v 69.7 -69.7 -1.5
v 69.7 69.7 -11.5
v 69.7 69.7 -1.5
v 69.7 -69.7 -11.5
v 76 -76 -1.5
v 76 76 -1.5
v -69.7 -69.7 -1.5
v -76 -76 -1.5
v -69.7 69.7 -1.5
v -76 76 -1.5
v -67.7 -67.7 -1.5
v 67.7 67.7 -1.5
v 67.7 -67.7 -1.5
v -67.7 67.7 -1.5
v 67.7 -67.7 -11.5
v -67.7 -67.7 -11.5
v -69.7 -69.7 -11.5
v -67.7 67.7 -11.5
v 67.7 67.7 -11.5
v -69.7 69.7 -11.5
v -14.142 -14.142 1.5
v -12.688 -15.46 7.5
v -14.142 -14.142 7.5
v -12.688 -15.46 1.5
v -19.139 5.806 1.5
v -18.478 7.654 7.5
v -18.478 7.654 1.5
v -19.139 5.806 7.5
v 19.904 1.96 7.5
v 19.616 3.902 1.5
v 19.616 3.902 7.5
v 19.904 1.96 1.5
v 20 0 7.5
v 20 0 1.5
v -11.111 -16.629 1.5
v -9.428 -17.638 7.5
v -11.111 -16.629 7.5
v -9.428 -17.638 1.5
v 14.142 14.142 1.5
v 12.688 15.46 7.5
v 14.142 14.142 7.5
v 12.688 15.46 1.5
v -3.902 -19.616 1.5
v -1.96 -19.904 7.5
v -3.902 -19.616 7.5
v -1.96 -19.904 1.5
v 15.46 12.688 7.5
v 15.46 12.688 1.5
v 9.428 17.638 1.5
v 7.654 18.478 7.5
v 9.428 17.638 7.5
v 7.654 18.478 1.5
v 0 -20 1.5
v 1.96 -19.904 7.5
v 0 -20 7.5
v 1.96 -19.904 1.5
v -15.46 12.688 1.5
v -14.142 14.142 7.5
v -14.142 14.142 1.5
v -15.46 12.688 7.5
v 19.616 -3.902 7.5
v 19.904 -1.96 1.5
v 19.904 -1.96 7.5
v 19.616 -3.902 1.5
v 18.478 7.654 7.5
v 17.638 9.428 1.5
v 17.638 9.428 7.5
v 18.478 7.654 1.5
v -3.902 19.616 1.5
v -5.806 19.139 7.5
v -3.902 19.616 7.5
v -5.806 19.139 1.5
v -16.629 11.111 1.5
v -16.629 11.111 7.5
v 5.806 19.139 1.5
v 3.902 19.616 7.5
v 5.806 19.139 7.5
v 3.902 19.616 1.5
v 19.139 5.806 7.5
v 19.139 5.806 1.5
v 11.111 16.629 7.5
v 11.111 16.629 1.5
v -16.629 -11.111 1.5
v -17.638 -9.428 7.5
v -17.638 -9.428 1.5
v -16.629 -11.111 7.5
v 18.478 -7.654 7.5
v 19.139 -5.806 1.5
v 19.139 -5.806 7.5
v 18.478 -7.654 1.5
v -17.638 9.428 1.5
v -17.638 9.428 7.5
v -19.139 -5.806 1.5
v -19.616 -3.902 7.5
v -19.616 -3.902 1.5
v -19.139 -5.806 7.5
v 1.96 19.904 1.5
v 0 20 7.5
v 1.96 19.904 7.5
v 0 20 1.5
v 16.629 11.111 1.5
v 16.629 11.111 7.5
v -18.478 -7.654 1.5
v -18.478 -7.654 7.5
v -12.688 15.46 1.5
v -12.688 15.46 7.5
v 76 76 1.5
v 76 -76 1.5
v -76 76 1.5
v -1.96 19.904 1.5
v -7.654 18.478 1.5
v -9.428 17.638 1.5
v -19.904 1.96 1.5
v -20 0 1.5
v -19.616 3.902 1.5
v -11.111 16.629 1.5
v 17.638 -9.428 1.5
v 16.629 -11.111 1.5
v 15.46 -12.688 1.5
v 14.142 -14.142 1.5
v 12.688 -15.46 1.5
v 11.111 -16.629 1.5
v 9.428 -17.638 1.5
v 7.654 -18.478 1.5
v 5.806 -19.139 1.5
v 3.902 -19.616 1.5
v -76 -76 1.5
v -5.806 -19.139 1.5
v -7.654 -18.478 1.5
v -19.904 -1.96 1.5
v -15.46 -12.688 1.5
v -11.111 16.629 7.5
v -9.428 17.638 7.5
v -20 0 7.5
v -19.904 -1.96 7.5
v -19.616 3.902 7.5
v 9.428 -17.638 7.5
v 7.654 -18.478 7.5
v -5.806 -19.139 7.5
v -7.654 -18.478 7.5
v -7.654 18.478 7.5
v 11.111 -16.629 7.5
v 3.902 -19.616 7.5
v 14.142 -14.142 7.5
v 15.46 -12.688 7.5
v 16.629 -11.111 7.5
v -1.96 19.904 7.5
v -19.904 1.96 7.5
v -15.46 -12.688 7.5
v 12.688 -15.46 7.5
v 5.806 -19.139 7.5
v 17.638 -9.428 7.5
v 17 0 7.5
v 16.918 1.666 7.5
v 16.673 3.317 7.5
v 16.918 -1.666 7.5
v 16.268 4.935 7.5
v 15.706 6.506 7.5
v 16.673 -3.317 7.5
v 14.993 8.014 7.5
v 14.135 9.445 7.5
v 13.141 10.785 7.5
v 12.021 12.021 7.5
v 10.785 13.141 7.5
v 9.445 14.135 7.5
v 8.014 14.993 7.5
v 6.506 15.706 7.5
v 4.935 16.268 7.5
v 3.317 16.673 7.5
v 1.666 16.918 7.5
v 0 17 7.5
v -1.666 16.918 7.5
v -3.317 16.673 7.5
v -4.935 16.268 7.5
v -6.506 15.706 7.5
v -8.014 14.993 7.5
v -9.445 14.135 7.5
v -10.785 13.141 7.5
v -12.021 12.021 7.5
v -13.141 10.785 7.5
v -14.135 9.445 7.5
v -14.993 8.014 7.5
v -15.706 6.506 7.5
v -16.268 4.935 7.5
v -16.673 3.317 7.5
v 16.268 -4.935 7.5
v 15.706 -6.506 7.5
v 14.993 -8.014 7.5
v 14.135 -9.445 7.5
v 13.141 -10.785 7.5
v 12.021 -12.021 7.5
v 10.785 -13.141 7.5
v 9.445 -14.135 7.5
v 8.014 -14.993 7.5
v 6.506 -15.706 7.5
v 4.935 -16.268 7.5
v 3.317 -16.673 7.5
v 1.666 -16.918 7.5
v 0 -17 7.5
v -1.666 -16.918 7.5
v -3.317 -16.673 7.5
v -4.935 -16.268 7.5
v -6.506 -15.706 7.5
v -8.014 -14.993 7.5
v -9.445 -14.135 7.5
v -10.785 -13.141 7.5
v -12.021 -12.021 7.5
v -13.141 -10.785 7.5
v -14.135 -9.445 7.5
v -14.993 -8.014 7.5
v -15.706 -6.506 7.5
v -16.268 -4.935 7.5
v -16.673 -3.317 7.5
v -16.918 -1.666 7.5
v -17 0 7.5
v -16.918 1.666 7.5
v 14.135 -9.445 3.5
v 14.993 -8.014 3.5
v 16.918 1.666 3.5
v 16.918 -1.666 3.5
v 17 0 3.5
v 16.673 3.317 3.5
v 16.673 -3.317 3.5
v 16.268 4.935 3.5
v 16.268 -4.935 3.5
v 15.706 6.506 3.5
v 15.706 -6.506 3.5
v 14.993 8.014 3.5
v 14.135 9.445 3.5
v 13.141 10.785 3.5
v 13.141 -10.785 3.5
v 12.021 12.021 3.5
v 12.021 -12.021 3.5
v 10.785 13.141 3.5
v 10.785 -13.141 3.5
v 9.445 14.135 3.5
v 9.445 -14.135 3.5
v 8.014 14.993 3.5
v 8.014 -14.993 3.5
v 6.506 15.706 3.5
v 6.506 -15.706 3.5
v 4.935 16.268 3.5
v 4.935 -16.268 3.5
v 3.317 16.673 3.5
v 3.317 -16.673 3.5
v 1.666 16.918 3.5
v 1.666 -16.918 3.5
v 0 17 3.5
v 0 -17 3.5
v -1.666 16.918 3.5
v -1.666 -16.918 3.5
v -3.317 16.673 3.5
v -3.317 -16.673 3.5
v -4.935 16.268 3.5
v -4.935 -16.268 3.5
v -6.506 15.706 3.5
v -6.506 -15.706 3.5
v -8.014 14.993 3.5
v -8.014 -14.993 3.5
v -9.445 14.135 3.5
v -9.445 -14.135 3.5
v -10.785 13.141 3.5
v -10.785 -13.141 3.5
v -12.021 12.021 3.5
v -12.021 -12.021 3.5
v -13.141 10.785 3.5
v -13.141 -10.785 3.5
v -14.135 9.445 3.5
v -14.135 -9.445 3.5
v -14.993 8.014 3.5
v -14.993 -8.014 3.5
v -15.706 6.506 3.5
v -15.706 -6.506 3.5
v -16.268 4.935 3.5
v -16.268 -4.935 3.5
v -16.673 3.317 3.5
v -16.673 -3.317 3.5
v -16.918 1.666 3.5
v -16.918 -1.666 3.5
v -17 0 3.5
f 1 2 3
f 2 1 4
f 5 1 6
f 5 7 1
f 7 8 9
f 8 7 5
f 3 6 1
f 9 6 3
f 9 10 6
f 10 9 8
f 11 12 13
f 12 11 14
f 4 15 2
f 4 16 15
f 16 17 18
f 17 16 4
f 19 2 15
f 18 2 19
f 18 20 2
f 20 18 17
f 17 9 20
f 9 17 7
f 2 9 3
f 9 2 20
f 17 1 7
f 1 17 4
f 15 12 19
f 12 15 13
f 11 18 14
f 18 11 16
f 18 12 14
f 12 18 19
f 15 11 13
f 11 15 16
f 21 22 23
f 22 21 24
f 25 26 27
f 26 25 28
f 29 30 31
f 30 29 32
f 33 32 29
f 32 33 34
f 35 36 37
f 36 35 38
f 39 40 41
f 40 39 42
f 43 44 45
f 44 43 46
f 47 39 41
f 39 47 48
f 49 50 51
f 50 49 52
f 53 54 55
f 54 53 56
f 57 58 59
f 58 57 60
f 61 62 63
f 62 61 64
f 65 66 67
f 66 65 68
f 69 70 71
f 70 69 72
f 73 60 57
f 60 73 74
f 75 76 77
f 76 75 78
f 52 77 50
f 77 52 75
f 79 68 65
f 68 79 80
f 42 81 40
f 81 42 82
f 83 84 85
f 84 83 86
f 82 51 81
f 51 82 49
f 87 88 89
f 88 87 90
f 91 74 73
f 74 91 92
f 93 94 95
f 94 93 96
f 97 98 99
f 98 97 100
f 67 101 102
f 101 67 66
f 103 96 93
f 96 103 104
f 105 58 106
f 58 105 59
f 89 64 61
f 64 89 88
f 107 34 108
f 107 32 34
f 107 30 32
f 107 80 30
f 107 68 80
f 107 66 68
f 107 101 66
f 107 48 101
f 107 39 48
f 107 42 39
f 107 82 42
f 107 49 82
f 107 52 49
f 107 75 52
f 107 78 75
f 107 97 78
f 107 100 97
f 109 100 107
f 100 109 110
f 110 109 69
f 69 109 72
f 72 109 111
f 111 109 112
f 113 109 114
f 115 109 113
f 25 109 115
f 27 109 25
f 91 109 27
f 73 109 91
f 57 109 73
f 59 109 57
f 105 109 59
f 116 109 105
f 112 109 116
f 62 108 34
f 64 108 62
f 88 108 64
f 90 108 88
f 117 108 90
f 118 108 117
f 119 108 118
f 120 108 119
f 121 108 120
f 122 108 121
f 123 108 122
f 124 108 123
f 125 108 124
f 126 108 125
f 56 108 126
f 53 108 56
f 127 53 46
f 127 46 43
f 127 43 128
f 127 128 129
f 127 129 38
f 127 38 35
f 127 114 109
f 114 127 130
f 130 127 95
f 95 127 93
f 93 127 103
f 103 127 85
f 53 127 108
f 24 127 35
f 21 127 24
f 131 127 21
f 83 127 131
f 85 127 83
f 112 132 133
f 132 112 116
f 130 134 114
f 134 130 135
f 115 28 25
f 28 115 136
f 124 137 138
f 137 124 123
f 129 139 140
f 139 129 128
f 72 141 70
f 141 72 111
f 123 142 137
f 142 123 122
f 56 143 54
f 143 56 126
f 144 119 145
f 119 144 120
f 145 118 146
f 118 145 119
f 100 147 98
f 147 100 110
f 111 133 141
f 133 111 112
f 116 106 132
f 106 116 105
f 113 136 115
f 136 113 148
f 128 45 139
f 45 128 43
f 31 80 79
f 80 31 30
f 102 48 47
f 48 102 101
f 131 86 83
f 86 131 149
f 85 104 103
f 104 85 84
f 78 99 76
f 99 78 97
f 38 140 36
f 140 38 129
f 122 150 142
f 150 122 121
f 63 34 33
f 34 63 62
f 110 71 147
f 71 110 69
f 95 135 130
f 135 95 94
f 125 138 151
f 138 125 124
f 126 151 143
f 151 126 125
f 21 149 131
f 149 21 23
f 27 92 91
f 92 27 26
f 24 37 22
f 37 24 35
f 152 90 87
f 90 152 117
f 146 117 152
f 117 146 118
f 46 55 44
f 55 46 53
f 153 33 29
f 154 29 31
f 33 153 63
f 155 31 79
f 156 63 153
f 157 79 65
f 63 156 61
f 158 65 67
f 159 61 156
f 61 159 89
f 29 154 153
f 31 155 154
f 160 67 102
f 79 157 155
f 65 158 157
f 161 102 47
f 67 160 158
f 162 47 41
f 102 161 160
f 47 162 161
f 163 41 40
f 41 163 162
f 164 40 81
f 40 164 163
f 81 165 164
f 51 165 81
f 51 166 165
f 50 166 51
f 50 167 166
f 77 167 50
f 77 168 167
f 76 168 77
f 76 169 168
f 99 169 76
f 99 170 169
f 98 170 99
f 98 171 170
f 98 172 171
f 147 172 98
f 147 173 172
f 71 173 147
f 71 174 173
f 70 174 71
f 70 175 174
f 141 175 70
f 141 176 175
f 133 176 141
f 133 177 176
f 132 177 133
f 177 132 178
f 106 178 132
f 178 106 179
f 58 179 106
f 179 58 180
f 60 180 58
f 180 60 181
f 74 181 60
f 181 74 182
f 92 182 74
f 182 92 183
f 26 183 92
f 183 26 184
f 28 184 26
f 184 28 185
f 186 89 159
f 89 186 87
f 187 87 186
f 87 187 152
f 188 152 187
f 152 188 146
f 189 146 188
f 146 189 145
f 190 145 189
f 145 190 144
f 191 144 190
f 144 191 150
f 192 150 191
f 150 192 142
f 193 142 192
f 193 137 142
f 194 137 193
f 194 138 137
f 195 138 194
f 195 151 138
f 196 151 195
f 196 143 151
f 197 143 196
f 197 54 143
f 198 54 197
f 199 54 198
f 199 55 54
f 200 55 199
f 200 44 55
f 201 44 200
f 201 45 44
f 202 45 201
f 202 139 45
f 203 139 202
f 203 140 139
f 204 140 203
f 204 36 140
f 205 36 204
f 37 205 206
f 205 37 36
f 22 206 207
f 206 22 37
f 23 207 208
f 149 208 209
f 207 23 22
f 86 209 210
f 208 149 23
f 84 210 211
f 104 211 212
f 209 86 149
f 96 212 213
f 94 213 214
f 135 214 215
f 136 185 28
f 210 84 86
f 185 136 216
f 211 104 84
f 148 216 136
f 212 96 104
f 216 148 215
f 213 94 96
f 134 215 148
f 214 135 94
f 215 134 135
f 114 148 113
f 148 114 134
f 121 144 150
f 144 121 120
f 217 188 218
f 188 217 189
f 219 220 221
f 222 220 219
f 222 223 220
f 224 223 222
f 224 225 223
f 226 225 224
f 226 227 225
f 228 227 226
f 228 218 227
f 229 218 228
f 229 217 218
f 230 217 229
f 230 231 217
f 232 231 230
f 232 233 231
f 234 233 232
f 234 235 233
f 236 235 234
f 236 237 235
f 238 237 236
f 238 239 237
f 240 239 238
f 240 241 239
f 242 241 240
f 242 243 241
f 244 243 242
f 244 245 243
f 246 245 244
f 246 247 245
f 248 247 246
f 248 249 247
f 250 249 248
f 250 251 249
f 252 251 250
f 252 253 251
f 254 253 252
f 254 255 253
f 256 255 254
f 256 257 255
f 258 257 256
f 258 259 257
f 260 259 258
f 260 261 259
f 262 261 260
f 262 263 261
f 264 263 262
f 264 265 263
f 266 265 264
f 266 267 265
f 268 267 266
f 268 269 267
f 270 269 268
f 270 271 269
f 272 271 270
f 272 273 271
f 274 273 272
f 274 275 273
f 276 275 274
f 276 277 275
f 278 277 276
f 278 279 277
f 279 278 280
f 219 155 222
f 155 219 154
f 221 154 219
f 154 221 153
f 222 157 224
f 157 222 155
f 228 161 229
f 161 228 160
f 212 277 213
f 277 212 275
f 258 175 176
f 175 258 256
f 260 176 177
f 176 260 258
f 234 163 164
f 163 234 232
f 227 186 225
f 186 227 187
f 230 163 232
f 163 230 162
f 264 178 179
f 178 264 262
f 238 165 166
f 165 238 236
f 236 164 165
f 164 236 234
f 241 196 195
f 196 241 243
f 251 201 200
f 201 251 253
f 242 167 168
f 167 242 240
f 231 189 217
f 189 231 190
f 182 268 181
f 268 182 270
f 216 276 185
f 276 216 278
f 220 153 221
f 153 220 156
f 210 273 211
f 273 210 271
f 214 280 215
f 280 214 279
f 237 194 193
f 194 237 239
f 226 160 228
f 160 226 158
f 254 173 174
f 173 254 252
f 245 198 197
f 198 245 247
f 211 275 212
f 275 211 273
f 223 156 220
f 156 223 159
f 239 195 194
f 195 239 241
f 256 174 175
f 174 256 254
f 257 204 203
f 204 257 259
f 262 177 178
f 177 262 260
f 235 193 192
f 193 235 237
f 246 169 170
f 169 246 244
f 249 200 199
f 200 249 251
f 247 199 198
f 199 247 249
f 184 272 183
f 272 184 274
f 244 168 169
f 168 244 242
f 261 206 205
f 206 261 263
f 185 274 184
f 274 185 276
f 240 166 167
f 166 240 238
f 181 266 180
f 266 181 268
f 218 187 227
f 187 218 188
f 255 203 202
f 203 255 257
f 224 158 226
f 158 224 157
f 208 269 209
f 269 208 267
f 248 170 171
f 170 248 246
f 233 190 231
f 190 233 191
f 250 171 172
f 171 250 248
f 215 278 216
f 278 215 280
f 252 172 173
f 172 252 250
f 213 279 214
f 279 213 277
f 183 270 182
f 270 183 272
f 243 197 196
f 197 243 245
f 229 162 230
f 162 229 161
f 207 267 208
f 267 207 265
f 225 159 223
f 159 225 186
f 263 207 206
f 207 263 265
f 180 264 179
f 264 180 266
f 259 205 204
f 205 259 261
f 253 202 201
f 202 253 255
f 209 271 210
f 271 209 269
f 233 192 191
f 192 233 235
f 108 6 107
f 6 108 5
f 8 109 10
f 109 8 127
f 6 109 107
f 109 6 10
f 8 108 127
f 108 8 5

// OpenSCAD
// file: common.scad
// common.scad — every dimension in the feeder lives here.
// Change a value, re-run ../check.sh, and every part regrows together.

/* ---------- Printer envelope ---------- */
bed_x = 220;
bed_y = 220;
bed_z = 250;

/* ---------- Material and process ---------- */
wall      = 2.0;    // nominal wall thickness (5 perimeters at 0.4 nozzle)
fit_slide = 0.30;   // clearance for parts that must move against each other
fit_press = 0.15;   // clearance for parts pressed together
$fn       = 96;

/* ---------- Fasteners ---------- */
m3_free = 3.4;      // M3 clearance hole
m3_tap  = 2.8;      // M3 self-tapping into plastic
m4_free = 4.5;

/* ---------- Load cells (VERIFY against the cells you actually buy) ----------
   Figures below are for the common YZC-133 straight bar. Bolt spacing varies
   between suppliers; measure yours before printing the base or the platform. */
cell_l            = 80;
cell_w            = 12.7;
cell_h            = 12.7;
cell_bolt_spacing = 15;   // centre-to-centre, at each end
cell_gap          = 3;    // spacer thickness — the beam MUST be free to flex

/* ---------- Food model ---------- */
kibble_density = 0.40;   // g/cm^3, dry kibble bulk density

/* ---------- Hopper ---------- */
hopper_volume_l = 2.0;
hopper_mouth    = 140;   // inner, square, at the top
hopper_throat   = 55;    // inner, square, at the bottom

// Square frustum volume: V = h/3 * (A1 + A2 + sqrt(A1*A2))
// For squares sqrt(A1*A2) collapses to mouth*throat, so height is exact:
hopper_h = 3 * hopper_volume_l * 1000000 /
           (hopper_mouth*hopper_mouth + hopper_throat*hopper_throat +
            hopper_mouth*hopper_throat);

hopper_run        = (hopper_mouth - hopper_throat) / 2;
hopper_wall_angle = atan(hopper_h / hopper_run);   // from horizontal
hopper_taper_rate = (hopper_mouth - hopper_throat) / hopper_h;
hopper_capacity_g = hopper_volume_l * 1000 * kibble_density;

/* ---------- Drum valve ---------- */
drum_dia       = 50;
drum_len       = 60;
drum_clearance = 0.4;                      // radial
drum_bore      = drum_dia + 2*drum_clearance;
pocket_depth   = 11.3;                     // segment depth of the scoop
shaft_dia      = 6;
shaft_len      = 8;

// Circular-segment maths. OpenSCAD trig is in DEGREES; the segment area
// formula needs the angle in RADIANS, hence the two forms below.
drum_r          = drum_dia / 2;
pocket_theta    = 2 * acos(1 - pocket_depth/drum_r);        // degrees
pocket_theta_r  = pocket_theta * PI / 180;                  // radians
pocket_area     = drum_r*drum_r/2 * (pocket_theta_r - sin(pocket_theta));
pocket_volume   = pocket_area * drum_len;                   // mm^3
sweep_grams     = pocket_volume / 1000 * kibble_density;    // DERIVED, not assumed

/* ---------- Valve housing ---------- */
housing_x = drum_len + 4*wall;      // along the drum axis
housing_y = drum_bore + 4*wall;
housing_z = drum_bore + 4*wall;
outlet_x  = 45;
outlet_y  = 45;

/* ---------- Chute ---------- */
chute_forward = 70;    // how far forward of the tower the food lands
chute_drop    = 90;    // vertical fall from valve outlet to chute exit
chute_exit    = 40;
chute_clear   = 40;    // exit height above the bowl rim — impulse, not load

/* ---------- Bowl and platform ---------- */
bowl_dia     = 140;    // the BOUGHT stainless/ceramic bowl
platform_dia = 150;
platform_t   = 5;
ring_w       = 3;
ring_h       = 8;
bowl_gap     = 6;      // air on every side — the isolation gap

/* ---------- Base and tower ---------- */
base_size = 190;
base_t    = 6;
bay_h     = 28;        // electronics bay height
tower_w   = 90;
tower_d   = 70;
tower_h   = 150;

/* ---------- Head ---------- */
head_tilt   = 30;      // camera, degrees down from horizontal
cam_pcb     = [40, 40, 1.6];
sr04_dia    = 16;
sr04_pitch  = 26;      // centre-to-centre of the two transducers

/* ---------- Derived overall ---------- */
total_h = base_t + bay_h + tower_h + housing_z + hopper_h;

/* ---------- Assertions: the things that silently ruin a print ---------- */
assert(hopper_wall_angle >= 60,
       str("Hopper wall ", hopper_wall_angle, " deg is below 60 - kibble will bridge"));
assert(hopper_h + 2*wall <= bed_z,
       str("Hopper ", hopper_h, " mm exceeds bed Z ", bed_z));
assert(hopper_mouth + 2*wall <= bed_x,
       "Hopper mouth exceeds bed X");
assert(base_size <= bed_x && base_size <= bed_y,
       "Base exceeds bed footprint");
assert(platform_dia <= bed_x, "Bowl platform exceeds bed X");
assert(drum_clearance > 0, "Drum clearance must be positive or the drum seizes");
assert(drum_bore > drum_dia, "Drum bore must exceed drum diameter");
assert(pocket_depth < drum_r,
       "Pocket deeper than the drum radius - the scoop would cut through the axis");
assert(sweep_grams > 6 && sweep_grams < 10,
       str("Sweep delivers ", sweep_grams, " g - outside the 6-10 g design window"));
assert(bowl_gap > 0, "Bowl isolation gap must be positive");
assert(cell_gap > 0, "Load cell needs a flex gap or it reads nothing");
assert(chute_forward + 40 <= bed_y,
       "Bowl arm exceeds bed Y - split it or shorten chute_forward");

/* ---------- Shared geometry ---------- */
// A square frustum, bottom face on the XY plane, centred on Z.
module frustum(bottom, top, h) {
  linear_extrude(height = h, scale = top/bottom)
    square([bottom, bottom], center = true);
}

// A rectangular tube used for the labyrinth lip on the lid and hopper mouth.
module lip(inner, thickness, h) {
  difference() {
    cube([inner + 2*thickness, inner + 2*thickness, h], center = true);
    cube([inner, inner, h + 1], center = true);
  }
}

// Four bolt holes on a square pattern.
module bolt_square(spacing, dia, h) {
  for (i = [0:3])
    rotate([0, 0, 90*i])
      translate([spacing/2, spacing/2, 0])
        cylinder(d = dia, h = h, center = true, $fn = 24);
}

// The cantilever footprint a load cell bolts into: two holes plus a relief slot.
module cell_mount(dia = m3_tap, h = 10) {
  for (y = [-cell_bolt_spacing/2, cell_bolt_spacing/2])
    translate([0, y, 0]) cylinder(d = dia, h = h, center = true, $fn = 24);
}

echo(str("hopper_h = ", hopper_h, " mm"));
echo(str("hopper wall angle = ", hopper_wall_angle, " deg"));
echo(str("hopper capacity = ", hopper_capacity_g, " g"));
echo(str("sweep = ", sweep_grams, " g"));
echo(str("total height = ", total_h, " mm"));
// main file
include <common.scad>

lid_t     = 3;
lid_over  = 4;                 // overhang past the hopper rim
lid_inner = hopper_mouth - fit_slide * 2;

module lid() {
  union() {
    // Top plate.
    cube([hopper_mouth + 2*wall + 2*lid_over,
          hopper_mouth + 2*wall + 2*lid_over, lid_t], center = true);
    // Labyrinth lip that drops into the mouth — keeps humidity and paws out.
    translate([0, 0, -lid_t/2 - 5])
      lip(lid_inner - 2*wall, wall, 10);
    // Finger recess boss.
    translate([0, 0, lid_t/2])
      difference() {
        cylinder(d = 40, h = 6, $fn = 64);
        translate([0, 0, 2]) cylinder(d = 34, h = 6, $fn = 64);
      }
  }
}

lid();
